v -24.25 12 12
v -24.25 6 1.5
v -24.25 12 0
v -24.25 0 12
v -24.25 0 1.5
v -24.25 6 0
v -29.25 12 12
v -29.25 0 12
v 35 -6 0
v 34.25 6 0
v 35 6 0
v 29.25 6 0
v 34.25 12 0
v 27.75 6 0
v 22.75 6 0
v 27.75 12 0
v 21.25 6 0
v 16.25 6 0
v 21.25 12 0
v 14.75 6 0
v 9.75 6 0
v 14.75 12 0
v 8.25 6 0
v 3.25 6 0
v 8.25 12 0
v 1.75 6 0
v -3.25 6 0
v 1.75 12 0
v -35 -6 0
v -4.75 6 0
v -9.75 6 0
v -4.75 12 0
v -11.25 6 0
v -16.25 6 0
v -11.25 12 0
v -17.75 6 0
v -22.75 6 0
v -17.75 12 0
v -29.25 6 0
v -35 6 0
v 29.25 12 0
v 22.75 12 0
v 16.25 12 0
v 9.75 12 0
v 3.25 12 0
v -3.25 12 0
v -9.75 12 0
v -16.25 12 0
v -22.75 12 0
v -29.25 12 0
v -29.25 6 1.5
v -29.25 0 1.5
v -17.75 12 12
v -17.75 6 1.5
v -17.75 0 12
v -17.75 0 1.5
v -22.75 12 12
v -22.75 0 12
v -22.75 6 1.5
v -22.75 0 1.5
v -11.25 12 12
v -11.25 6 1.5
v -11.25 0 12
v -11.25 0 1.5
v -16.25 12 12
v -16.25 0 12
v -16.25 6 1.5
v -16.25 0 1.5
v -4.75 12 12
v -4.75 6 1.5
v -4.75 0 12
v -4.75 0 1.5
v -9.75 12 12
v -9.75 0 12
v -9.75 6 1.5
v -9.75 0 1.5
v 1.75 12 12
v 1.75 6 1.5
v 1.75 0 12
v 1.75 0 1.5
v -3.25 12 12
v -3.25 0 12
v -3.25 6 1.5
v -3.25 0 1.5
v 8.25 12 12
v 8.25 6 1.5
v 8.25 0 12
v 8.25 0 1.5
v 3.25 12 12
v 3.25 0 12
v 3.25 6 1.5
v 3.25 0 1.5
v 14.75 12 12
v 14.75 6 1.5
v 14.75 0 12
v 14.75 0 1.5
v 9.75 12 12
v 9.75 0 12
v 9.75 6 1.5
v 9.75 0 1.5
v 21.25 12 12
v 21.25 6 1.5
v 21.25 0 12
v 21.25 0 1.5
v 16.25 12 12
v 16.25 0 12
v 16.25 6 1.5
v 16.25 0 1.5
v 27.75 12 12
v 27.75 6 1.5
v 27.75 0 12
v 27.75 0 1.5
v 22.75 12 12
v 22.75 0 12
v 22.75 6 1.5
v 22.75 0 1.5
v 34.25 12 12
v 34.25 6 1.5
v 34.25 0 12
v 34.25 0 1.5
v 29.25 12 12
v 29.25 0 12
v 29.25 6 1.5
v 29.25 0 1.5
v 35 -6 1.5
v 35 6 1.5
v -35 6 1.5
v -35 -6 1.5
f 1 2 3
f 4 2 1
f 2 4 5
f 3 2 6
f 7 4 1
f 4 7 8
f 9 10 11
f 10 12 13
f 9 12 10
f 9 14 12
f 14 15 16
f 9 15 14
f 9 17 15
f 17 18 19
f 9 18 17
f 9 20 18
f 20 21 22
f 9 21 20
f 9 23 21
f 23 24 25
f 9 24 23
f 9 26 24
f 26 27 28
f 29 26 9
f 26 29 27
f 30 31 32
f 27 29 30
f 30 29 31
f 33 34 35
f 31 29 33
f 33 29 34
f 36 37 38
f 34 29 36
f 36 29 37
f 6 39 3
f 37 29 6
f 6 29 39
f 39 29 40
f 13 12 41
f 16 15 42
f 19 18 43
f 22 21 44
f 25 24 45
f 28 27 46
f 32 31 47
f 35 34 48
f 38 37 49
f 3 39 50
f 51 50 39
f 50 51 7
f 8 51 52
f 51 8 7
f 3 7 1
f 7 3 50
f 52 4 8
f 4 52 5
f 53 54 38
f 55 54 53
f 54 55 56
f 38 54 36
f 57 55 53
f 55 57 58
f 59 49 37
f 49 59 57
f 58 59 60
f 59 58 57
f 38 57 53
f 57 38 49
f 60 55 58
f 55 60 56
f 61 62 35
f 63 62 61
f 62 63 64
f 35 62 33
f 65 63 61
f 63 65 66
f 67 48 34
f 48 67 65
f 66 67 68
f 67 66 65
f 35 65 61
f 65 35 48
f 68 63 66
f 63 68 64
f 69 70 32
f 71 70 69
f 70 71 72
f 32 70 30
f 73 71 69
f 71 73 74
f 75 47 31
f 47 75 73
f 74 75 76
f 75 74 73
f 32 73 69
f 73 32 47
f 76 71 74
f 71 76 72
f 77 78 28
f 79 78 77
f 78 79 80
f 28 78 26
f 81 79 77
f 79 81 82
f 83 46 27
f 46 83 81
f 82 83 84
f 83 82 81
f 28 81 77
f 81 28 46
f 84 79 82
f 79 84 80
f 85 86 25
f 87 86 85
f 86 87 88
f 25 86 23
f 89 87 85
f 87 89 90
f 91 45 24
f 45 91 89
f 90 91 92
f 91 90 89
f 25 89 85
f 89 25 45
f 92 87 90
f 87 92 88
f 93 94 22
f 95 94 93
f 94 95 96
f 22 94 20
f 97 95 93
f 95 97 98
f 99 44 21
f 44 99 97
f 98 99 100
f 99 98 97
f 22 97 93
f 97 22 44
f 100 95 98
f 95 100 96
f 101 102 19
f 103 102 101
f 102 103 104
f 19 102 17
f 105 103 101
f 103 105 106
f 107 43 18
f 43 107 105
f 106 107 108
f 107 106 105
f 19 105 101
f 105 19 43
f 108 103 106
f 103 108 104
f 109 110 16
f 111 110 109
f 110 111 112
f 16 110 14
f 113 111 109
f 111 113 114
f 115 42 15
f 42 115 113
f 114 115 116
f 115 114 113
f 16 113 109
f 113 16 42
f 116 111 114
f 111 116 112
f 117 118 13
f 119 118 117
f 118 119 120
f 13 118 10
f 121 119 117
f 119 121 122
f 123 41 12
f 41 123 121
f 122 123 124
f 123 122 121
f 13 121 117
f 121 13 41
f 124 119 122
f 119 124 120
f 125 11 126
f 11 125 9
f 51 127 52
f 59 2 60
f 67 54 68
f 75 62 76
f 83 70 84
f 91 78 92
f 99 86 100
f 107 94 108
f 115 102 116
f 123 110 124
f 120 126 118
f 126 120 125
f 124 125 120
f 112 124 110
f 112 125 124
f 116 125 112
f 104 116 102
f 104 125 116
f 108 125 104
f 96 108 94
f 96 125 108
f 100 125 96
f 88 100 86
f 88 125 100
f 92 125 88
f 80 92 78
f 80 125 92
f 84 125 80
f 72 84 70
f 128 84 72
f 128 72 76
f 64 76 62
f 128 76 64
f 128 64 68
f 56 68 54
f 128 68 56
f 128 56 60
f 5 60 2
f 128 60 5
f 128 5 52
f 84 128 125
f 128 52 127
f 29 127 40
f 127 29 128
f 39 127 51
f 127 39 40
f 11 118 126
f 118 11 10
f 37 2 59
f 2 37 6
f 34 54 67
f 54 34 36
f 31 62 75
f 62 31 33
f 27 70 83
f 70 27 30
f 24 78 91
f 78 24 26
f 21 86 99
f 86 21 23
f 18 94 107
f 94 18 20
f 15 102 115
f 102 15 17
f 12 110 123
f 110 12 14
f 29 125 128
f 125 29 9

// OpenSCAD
// 10-well comb for casting agarose gels
// Print orientation: flat on bed, teeth pointing down (-Z)

$fn = 64;

// ---- Dimensions (mm) ----
comb_length    = 70;    // spine (back bar) length in X
comb_width     = 12;    // spine width in Y
plate_thick    = 1.5;   // base plate thickness in Z
tooth_count    = 10;    // number of wells/teeth
tooth_width    = 5.0;   // tooth width in X
tooth_length   = 12;    // tooth length in Y
tooth_depth    = 12;    // tooth depth from spine in -Y
tooth_gap      = 1.5;   // gap between neighbouring teeth in X
overcut        = 0.5;   // extra length on cutters to avoid coplanar faces

// ---- Derived ----
pitch   = tooth_width + tooth_gap;             // centre-to-centre spacing
x_start = -(tooth_count - 1) * pitch / 2;      // first tooth centre (row centred)

// ---- Model ----
union() {
    // Base plate
    translate([-comb_length / 2, -comb_width / 2, 0])
        cube([comb_length, comb_width, plate_thick]);

    // Teeth (wells), cast from the spine
    for (i = [0 : tooth_count - 1]) {
        translate([x_start + i * pitch, 0, 0])
            cube([tooth_width, tooth_length, tooth_depth]);
    }
}
